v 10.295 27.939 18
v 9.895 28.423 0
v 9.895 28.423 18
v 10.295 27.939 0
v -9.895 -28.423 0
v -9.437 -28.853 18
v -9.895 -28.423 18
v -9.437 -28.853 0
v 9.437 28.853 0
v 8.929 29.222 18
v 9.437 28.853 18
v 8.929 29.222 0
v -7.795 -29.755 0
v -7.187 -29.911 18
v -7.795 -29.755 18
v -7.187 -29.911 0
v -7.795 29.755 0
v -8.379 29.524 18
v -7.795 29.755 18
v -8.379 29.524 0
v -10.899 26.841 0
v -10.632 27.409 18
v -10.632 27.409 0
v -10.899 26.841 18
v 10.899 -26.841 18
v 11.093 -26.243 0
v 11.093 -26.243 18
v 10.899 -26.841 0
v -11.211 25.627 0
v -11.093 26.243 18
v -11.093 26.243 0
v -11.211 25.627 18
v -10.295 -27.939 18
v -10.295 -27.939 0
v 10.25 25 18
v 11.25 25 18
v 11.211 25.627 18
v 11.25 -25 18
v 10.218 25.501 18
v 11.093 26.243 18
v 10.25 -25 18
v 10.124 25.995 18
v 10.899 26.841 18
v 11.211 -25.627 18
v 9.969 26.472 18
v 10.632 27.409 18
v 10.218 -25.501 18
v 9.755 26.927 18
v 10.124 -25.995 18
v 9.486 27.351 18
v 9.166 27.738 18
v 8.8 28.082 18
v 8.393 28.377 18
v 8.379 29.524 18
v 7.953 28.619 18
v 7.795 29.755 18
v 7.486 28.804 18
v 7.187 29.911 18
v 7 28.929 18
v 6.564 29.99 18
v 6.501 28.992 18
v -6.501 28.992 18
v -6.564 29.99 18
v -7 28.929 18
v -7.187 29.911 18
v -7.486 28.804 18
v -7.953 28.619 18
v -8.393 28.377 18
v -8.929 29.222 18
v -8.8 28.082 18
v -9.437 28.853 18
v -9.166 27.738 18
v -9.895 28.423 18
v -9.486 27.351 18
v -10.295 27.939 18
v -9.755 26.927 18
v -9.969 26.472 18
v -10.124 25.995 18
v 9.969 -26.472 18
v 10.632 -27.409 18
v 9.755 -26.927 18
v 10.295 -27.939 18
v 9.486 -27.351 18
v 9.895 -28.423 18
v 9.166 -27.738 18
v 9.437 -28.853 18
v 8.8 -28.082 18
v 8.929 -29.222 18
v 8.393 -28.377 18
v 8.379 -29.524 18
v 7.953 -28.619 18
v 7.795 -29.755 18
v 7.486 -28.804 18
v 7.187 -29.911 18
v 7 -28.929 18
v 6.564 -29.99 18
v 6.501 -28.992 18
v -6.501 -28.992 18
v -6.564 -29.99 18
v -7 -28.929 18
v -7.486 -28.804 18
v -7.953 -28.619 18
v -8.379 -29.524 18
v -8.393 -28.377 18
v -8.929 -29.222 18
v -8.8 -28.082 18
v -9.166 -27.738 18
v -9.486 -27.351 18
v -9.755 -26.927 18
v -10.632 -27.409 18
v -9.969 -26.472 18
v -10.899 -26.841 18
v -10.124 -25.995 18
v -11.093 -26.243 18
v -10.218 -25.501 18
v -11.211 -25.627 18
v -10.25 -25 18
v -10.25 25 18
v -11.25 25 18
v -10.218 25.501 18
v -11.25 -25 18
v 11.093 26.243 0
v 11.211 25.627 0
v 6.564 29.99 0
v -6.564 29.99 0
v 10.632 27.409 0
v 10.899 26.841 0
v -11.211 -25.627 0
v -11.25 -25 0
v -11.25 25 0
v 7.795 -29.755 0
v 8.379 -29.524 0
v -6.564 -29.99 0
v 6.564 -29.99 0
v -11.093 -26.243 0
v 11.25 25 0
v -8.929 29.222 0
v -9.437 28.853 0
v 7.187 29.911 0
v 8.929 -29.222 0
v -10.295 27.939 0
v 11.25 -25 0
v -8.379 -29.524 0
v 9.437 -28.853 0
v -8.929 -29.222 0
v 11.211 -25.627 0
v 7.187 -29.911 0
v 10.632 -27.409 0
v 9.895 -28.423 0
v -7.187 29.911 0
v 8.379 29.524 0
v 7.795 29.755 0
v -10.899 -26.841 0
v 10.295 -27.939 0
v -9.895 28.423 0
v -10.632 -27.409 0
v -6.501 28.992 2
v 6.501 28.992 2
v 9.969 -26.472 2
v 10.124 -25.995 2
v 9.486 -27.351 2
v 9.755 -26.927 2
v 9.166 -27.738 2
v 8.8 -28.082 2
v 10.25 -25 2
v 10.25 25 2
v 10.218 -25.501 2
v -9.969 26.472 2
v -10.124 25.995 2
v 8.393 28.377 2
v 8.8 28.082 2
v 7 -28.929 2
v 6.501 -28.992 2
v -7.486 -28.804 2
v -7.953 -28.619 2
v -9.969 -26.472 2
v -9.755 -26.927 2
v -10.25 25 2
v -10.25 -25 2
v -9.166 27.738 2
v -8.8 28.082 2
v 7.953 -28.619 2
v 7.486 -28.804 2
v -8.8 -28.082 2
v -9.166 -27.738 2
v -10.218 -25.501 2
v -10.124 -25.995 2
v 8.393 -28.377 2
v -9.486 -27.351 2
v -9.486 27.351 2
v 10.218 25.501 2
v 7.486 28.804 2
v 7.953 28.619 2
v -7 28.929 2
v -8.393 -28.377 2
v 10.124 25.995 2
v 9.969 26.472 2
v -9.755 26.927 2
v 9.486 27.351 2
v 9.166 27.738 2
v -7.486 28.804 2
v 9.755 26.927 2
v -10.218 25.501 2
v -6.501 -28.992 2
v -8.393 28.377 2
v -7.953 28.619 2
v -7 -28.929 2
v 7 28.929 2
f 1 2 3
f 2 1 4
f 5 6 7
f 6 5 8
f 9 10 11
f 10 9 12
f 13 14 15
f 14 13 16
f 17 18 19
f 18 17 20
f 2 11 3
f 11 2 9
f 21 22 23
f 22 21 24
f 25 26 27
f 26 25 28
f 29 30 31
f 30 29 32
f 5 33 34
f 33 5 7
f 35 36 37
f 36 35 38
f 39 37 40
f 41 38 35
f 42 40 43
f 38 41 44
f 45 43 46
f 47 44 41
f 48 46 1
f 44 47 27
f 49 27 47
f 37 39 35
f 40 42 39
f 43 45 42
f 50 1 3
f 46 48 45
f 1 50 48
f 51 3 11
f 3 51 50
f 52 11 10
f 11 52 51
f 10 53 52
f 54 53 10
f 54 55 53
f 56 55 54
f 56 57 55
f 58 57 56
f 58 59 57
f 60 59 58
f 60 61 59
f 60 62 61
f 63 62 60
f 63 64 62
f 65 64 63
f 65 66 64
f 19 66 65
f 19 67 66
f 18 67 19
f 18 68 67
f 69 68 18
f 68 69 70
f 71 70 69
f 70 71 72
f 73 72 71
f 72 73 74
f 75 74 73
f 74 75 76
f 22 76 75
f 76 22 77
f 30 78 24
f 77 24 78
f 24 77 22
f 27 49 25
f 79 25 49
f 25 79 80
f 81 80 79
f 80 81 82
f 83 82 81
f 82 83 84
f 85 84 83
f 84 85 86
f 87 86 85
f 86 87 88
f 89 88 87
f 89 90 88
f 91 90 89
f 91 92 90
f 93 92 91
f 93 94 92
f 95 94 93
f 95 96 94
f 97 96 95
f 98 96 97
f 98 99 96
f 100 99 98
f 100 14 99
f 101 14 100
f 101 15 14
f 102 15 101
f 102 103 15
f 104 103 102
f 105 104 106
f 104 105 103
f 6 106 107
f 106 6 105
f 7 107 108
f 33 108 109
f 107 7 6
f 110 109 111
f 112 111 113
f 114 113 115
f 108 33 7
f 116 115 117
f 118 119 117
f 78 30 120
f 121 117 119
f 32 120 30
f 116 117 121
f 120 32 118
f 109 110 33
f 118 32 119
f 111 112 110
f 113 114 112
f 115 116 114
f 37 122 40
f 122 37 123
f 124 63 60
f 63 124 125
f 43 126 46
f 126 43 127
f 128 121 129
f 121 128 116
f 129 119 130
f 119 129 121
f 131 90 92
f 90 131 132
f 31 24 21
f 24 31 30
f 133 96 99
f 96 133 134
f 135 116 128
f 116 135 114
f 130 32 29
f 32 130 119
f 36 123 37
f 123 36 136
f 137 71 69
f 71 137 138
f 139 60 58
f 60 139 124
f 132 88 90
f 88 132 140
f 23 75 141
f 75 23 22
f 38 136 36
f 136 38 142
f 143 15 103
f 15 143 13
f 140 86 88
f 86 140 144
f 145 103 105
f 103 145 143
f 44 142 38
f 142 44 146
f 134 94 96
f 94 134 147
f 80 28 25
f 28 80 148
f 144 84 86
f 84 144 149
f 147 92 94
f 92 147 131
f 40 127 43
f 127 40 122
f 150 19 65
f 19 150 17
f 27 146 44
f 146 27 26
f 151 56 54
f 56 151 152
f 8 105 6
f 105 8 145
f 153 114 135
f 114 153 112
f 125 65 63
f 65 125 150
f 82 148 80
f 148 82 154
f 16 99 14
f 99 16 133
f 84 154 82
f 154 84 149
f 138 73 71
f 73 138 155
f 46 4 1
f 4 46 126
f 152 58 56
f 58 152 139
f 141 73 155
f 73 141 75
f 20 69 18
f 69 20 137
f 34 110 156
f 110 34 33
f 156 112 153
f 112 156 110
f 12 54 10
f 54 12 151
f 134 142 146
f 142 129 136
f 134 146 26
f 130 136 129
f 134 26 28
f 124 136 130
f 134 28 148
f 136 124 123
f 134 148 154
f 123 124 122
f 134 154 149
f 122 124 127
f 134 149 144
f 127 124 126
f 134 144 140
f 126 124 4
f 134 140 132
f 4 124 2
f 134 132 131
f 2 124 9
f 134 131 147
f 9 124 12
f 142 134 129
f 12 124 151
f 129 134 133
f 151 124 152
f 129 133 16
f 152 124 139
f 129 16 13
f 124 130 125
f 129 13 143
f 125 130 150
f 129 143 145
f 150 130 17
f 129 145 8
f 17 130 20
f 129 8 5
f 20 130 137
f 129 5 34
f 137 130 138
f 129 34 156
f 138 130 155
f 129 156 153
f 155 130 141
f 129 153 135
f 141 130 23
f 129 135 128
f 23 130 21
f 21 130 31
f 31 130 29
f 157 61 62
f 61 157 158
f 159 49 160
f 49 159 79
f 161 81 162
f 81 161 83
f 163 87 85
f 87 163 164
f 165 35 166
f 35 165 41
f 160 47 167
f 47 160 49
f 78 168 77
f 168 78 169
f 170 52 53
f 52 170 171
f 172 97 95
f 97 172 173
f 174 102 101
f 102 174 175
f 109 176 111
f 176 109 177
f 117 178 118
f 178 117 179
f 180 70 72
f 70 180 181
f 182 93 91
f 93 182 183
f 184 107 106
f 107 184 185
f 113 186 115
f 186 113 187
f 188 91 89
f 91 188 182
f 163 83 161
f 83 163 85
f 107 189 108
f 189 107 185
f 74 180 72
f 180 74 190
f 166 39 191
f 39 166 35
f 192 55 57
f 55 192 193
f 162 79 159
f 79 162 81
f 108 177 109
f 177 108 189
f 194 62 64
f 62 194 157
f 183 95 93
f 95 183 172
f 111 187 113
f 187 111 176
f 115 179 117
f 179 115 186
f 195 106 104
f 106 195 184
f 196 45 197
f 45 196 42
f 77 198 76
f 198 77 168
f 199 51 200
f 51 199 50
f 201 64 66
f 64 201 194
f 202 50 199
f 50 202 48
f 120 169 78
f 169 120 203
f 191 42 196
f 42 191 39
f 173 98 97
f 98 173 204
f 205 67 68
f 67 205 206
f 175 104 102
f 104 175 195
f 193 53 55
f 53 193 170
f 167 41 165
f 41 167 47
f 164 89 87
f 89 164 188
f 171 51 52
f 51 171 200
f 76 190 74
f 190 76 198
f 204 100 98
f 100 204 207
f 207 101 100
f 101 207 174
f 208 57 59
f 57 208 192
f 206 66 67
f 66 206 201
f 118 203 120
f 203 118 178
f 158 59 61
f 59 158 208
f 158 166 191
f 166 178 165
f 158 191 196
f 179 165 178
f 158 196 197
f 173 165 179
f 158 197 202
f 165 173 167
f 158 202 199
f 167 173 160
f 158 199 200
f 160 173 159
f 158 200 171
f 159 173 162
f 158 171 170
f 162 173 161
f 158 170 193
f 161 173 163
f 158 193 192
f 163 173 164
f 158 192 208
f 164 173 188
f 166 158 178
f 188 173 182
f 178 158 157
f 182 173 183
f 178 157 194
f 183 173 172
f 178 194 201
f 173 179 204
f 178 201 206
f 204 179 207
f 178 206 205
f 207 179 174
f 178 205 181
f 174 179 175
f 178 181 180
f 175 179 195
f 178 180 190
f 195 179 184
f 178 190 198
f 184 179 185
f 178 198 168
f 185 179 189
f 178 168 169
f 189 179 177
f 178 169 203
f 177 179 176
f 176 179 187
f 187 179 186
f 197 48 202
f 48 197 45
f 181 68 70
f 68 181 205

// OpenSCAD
$fn = 50;


difference() {
	union() {
		hull() {
			translate(v = [-6.2500000000, 25.0000000000, 0]) {
				cylinder(h = 18, r = 5);
			}
			translate(v = [6.2500000000, 25.0000000000, 0]) {
				cylinder(h = 18, r = 5);
			}
			translate(v = [-6.2500000000, -25.0000000000, 0]) {
				cylinder(h = 18, r = 5);
			}
			translate(v = [6.2500000000, -25.0000000000, 0]) {
				cylinder(h = 18, r = 5);
			}
		}
	}
	union() {
		translate(v = [0, 0, 2]) {
			hull() {
				translate(v = [-6.2500000000, 25.0000000000, 0]) {
					cylinder(h = 16, r = 4);
				}
				translate(v = [6.2500000000, 25.0000000000, 0]) {
					cylinder(h = 16, r = 4);
				}
				translate(v = [-6.2500000000, -25.0000000000, 0]) {
					cylinder(h = 16, r = 4);
				}
				translate(v = [6.2500000000, -25.0000000000, 0]) {
					cylinder(h = 16, r = 4);
				}
			}
		}
	}
}
